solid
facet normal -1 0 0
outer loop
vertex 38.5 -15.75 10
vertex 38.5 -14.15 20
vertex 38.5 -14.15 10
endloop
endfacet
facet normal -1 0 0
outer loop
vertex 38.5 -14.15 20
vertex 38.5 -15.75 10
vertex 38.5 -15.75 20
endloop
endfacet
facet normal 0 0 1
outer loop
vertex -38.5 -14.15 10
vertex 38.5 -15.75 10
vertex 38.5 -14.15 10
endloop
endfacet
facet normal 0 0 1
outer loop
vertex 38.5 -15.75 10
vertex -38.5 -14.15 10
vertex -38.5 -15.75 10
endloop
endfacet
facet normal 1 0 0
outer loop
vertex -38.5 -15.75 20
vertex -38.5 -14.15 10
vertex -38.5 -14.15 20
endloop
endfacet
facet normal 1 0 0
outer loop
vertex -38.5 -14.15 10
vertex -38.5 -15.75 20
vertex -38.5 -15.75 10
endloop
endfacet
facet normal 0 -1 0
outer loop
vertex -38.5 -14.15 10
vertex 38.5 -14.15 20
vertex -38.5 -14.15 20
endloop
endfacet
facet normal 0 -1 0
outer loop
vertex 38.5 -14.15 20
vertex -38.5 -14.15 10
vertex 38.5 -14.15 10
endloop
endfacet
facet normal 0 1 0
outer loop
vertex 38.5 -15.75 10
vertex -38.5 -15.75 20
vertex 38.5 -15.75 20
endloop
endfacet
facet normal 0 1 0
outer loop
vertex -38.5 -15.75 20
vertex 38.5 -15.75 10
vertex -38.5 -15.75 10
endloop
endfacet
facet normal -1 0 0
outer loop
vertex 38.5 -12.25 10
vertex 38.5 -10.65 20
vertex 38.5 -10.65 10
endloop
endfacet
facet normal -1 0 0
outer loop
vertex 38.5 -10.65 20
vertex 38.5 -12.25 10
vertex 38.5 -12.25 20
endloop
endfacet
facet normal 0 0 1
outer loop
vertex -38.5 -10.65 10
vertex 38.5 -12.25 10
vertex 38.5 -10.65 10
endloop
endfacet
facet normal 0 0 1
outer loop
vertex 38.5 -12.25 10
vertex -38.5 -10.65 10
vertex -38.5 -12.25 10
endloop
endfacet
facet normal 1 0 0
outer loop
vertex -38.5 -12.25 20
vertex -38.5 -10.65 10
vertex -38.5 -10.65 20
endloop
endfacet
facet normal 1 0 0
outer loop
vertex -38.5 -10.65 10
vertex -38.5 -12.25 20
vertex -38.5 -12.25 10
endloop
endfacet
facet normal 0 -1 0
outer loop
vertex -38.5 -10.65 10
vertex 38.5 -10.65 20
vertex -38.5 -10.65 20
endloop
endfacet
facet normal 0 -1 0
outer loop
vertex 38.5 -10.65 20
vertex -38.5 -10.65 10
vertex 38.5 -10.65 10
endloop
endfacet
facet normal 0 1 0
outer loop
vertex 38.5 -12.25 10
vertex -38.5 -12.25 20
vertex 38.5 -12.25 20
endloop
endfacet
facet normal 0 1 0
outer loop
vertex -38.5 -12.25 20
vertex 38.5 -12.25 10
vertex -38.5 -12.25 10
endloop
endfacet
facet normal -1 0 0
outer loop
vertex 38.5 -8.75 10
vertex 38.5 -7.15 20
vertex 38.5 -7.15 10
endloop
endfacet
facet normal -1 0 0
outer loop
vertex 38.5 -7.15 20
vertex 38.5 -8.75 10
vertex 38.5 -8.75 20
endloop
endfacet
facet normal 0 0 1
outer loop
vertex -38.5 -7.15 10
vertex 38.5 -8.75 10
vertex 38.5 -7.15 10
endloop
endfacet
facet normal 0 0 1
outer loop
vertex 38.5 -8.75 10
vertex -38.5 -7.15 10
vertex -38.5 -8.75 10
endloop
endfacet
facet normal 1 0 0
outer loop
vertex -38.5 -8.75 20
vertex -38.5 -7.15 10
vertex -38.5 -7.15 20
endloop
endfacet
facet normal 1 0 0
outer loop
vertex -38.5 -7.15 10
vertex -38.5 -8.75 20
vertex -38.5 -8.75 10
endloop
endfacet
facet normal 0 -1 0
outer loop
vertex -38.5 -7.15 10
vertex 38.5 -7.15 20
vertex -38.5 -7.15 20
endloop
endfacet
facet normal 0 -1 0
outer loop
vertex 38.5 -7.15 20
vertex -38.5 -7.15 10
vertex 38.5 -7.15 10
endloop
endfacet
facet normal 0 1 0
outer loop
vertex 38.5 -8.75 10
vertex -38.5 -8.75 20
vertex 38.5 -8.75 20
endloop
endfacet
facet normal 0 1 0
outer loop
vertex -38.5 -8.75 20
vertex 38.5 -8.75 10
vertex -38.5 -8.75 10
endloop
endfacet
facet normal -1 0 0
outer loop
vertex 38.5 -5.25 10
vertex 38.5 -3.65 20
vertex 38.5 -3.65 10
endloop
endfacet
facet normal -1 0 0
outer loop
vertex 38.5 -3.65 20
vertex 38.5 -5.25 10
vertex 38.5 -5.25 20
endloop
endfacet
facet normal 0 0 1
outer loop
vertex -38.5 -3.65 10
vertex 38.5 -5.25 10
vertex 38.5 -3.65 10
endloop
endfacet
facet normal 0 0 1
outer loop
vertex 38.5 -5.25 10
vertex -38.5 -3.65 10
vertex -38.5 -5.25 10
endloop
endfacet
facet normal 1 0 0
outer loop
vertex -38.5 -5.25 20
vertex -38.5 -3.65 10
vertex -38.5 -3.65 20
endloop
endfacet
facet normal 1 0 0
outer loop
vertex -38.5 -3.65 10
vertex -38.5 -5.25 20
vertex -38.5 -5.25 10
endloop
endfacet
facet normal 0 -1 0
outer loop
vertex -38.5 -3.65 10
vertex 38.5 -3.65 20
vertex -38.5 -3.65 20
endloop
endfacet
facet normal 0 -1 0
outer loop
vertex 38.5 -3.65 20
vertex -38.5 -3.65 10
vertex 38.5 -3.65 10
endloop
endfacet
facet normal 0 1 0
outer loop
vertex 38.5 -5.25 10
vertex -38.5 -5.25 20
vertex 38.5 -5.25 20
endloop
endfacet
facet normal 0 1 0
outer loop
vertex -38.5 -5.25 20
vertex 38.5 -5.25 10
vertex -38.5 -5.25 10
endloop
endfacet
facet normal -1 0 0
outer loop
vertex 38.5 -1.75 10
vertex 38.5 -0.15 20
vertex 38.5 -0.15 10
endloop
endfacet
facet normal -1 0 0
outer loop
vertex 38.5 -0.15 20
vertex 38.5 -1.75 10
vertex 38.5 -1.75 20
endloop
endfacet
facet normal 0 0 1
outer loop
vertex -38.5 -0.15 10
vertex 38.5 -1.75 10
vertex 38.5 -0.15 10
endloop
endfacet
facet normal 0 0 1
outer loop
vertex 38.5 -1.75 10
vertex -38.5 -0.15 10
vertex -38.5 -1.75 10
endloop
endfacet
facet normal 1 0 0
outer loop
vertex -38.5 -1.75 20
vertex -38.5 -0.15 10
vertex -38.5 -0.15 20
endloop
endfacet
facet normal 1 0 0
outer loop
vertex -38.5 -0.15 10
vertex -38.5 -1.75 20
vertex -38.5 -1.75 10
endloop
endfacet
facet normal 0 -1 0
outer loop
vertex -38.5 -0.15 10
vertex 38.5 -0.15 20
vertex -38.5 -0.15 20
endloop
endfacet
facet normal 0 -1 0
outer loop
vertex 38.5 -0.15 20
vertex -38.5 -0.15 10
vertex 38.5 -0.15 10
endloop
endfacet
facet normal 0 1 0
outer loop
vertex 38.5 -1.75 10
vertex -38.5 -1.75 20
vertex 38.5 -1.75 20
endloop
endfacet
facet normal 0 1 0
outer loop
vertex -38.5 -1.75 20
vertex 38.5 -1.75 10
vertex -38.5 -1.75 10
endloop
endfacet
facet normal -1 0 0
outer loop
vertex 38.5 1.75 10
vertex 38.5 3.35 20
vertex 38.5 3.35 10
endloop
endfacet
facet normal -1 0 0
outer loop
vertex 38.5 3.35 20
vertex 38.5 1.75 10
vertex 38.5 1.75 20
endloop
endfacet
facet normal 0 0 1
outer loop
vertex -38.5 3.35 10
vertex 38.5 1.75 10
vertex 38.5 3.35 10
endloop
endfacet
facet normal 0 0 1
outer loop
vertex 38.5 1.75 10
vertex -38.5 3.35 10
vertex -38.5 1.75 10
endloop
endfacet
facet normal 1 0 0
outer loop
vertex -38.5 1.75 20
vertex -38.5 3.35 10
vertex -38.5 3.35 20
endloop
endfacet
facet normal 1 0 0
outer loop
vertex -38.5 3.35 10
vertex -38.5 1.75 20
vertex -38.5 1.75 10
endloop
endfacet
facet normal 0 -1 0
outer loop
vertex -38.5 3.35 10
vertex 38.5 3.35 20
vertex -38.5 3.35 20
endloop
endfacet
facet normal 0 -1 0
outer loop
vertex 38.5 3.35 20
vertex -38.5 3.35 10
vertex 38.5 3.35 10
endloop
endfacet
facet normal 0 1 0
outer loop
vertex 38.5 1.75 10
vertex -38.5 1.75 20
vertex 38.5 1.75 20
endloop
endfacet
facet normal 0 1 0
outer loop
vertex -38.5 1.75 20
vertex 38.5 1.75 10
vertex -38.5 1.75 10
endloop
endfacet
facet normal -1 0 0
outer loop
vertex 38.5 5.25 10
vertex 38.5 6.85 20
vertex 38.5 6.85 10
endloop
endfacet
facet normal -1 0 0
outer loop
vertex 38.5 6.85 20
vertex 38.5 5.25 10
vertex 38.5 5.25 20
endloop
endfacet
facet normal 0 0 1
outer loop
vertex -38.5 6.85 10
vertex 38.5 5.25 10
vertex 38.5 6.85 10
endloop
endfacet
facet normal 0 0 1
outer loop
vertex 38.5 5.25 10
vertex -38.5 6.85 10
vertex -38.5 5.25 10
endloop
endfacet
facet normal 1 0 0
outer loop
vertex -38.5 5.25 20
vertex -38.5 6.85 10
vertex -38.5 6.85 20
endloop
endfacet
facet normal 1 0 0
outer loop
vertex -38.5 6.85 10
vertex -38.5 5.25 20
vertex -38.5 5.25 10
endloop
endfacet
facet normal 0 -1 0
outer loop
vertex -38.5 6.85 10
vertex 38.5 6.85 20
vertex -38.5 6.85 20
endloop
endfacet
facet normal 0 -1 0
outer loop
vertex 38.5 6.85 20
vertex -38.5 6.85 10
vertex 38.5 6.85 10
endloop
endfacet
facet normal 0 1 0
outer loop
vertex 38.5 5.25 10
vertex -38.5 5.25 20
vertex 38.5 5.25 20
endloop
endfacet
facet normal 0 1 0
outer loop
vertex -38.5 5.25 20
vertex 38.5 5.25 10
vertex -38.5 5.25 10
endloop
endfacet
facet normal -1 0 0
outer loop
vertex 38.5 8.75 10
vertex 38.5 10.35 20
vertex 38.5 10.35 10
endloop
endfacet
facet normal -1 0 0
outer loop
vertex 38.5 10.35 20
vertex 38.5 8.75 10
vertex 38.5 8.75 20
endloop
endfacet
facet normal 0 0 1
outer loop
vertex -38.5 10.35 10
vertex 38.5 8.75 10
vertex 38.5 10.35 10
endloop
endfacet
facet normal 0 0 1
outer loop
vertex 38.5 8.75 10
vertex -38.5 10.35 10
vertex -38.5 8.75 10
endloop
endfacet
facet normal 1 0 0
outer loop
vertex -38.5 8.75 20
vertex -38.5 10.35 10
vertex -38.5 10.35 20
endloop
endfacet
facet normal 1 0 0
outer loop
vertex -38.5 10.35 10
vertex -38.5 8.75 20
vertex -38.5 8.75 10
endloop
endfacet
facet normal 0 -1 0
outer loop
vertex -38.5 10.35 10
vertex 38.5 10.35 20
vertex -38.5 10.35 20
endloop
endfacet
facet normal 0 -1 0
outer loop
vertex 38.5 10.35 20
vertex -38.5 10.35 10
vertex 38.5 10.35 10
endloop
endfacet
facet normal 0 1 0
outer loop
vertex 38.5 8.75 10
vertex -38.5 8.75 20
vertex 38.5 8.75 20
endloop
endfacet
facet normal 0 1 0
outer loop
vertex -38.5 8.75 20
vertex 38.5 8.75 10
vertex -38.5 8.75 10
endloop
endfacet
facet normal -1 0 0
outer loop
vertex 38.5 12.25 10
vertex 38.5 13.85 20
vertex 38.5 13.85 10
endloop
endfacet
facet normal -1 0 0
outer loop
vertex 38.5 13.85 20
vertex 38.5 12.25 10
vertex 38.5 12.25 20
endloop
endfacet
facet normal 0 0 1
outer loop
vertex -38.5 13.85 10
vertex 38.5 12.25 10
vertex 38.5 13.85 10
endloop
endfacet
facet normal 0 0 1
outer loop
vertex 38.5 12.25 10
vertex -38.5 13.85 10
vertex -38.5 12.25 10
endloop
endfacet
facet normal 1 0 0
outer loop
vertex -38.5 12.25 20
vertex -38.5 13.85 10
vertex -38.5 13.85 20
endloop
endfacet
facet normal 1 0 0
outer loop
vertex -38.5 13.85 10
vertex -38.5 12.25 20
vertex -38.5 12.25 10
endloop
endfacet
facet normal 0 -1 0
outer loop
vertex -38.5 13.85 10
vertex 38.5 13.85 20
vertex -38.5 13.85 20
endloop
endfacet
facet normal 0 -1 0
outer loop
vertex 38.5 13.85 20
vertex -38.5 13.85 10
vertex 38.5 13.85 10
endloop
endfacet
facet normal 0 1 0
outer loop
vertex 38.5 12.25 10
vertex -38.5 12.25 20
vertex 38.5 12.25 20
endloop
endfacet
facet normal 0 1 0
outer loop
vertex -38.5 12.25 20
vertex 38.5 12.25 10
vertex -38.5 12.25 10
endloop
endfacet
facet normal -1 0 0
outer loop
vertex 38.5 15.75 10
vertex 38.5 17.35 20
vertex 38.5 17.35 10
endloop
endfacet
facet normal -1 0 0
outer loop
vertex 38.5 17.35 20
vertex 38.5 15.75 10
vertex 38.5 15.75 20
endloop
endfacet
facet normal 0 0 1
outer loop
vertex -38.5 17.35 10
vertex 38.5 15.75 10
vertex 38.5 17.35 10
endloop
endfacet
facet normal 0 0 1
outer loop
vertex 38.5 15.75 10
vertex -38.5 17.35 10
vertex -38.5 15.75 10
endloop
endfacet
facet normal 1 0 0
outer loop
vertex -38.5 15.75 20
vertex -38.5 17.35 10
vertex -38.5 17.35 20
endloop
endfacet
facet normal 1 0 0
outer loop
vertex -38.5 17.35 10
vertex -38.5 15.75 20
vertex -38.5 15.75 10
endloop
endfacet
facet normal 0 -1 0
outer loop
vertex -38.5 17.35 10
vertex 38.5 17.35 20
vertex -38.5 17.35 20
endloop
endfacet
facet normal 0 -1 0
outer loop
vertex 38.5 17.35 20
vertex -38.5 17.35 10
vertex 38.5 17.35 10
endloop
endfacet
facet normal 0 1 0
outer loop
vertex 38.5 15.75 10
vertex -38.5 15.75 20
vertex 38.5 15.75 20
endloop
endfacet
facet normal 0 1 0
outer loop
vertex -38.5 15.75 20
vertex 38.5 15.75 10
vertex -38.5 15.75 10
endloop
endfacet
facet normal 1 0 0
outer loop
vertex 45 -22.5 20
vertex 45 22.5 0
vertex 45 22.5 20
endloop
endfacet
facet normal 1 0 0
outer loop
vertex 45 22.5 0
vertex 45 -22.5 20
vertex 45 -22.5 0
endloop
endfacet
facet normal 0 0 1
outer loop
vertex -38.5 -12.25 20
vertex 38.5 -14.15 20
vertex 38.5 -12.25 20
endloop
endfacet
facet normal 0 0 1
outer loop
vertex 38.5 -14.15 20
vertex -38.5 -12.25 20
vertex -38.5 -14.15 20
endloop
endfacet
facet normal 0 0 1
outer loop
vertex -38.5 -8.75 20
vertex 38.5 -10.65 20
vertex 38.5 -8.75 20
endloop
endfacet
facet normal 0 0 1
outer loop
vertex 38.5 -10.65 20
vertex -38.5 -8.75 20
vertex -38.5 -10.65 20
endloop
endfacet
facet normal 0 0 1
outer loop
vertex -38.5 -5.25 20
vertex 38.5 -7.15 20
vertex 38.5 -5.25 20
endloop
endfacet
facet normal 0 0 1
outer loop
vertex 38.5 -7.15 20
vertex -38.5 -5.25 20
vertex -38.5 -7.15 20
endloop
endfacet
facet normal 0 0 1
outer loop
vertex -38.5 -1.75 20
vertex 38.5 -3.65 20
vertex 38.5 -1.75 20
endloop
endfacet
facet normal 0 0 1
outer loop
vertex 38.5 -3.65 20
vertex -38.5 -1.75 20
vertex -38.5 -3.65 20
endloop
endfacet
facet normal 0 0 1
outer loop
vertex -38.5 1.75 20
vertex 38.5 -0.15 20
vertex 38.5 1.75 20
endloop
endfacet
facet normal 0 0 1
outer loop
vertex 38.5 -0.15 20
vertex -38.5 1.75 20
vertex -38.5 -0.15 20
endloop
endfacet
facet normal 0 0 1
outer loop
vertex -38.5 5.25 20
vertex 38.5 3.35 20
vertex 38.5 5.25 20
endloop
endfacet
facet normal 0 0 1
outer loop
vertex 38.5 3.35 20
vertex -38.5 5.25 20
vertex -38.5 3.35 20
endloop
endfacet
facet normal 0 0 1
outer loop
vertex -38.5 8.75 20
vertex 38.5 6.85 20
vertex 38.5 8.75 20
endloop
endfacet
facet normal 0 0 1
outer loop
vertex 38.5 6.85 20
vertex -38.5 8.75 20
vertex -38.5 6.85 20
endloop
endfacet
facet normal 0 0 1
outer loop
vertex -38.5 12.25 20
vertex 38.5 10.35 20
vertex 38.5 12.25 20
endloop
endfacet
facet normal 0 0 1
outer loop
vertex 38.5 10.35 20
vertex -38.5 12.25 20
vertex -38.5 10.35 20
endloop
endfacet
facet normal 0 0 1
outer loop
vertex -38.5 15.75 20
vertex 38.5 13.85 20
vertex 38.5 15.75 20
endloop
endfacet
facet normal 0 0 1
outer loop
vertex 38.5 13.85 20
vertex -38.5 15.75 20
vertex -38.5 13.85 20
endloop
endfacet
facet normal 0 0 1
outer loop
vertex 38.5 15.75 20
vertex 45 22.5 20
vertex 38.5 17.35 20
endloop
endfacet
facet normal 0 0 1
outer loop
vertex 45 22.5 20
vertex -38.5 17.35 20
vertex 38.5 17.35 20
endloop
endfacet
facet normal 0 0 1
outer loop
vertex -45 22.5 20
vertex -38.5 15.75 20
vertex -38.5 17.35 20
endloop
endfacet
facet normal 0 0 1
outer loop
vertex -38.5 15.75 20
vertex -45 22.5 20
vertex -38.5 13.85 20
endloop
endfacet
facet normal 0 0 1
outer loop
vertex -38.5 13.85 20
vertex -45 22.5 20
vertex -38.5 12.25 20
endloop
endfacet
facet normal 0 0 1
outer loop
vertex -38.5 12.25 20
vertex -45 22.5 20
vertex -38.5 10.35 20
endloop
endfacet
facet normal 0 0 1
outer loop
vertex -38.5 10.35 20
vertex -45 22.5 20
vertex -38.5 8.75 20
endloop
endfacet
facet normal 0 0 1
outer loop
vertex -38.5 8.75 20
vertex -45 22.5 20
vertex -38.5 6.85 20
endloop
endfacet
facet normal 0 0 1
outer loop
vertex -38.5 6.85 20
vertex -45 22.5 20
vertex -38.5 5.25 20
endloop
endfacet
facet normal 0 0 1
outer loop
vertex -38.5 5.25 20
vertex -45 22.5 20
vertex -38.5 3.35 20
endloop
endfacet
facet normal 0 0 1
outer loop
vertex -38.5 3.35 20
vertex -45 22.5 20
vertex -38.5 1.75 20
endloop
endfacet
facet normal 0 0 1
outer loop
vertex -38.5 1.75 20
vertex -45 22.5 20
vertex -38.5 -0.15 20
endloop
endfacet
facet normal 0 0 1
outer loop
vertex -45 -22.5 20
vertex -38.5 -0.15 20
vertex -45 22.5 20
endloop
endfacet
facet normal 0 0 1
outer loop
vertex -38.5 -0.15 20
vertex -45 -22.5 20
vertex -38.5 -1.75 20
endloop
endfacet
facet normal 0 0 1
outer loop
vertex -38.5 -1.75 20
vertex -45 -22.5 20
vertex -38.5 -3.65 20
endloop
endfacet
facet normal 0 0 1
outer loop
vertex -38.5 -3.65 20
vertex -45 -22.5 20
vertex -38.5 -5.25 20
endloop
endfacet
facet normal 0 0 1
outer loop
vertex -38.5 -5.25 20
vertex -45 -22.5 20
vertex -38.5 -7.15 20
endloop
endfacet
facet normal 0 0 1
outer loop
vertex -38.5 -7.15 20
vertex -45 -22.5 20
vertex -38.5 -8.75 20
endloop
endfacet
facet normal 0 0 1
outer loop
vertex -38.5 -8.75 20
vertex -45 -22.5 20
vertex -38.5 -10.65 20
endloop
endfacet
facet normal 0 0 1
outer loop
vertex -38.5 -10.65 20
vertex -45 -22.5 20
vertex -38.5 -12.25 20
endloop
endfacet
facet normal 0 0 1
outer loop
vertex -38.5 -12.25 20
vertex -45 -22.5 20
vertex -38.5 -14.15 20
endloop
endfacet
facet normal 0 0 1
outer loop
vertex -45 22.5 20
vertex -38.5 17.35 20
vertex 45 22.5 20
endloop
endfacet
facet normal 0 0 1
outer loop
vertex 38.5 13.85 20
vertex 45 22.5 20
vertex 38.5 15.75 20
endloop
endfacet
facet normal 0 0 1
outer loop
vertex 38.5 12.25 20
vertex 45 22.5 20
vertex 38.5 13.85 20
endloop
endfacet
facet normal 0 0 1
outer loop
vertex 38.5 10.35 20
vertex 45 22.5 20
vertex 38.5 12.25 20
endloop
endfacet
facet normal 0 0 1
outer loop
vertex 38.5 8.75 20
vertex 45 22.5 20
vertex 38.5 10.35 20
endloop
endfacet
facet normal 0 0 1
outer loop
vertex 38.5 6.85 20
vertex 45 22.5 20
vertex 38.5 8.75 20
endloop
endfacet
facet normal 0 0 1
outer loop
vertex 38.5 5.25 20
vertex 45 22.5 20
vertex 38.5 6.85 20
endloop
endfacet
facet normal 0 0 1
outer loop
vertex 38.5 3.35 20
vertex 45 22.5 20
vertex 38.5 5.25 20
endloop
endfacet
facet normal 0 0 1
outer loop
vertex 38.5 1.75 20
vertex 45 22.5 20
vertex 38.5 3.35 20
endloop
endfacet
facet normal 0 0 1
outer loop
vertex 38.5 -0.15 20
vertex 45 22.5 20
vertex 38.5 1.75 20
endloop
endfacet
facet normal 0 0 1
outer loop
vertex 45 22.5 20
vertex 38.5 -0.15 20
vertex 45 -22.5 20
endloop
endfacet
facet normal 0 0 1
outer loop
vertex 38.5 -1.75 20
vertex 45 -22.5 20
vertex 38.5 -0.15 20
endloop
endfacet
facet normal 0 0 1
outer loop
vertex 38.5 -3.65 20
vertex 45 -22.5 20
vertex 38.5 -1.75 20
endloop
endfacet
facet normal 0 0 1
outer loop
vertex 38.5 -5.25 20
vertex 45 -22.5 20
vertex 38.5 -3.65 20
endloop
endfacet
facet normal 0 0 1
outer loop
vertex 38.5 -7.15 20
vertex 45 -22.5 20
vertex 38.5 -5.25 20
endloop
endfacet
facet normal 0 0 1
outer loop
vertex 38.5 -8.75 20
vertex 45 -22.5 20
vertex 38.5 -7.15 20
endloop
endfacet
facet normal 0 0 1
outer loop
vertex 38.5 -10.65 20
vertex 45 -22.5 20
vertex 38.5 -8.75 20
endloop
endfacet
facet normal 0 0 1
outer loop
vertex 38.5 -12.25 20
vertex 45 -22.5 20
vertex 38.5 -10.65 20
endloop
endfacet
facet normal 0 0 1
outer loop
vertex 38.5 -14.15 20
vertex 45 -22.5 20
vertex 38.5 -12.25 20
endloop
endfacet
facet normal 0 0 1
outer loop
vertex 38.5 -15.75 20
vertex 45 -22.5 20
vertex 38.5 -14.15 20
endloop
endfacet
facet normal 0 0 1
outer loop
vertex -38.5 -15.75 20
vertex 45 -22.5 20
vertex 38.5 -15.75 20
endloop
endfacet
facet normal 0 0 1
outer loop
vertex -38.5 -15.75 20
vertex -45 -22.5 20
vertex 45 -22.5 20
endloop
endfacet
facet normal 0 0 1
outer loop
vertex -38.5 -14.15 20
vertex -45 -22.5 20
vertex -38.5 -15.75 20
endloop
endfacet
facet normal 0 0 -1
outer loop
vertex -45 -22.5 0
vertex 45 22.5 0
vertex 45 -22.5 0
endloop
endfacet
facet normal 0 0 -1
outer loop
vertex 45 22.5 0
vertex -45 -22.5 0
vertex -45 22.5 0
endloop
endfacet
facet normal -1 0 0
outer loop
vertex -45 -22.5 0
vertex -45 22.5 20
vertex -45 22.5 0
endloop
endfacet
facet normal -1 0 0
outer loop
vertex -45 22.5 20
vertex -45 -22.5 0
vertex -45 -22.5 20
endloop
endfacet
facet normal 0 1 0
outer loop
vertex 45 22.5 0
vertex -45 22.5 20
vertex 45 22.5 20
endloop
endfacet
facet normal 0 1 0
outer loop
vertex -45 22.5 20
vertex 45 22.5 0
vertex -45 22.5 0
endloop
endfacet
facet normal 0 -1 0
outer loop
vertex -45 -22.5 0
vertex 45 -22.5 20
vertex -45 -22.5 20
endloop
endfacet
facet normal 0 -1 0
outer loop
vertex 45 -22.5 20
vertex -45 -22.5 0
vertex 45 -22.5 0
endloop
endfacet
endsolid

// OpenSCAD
// Slide drying rack for microscope slides (75 x 25 x 1 mm)
// Print orientation: base on XY plane, slots open upward (+Z)

// ---- Block ----
block_len   = 90;    // block length along X (mm)
block_wid   = 45;    // block width along Y (mm)
block_ht    = 20;    // block height along Z (mm)

// ---- Slots ----
slot_count  = 10;    // number of slide slots
slot_len    = 77;    // slot length along X (mm)
slot_wid    = 1.6;   // slot width along Y (mm)
slot_depth  = 10;    // slot depth from top face (mm)
slot_pitch  = 3.5;   // centre-to-centre spacing in Y (mm)

// ---- Misc ----
eps         = 0.5;   // overshoot for clean cuts (mm)
$fn         = 64;    // curve resolution

// Derived
first_y = -(slot_count - 1) * slot_pitch / 2;  // Y of first slot centre

difference() {
    // Solid base block
    translate([-block_len / 2, -block_wid / 2, 0])
        cube([block_len, block_wid, block_ht]);

    // Parallel slots, open at the top
    for (i = [0 : slot_count - 1]) {
        translate([ -slot_len / 2,
                     first_y + i * slot_pitch,
                     block_ht - slot_depth ])
            cube([slot_len, slot_wid, slot_depth + eps]);
    }
}
